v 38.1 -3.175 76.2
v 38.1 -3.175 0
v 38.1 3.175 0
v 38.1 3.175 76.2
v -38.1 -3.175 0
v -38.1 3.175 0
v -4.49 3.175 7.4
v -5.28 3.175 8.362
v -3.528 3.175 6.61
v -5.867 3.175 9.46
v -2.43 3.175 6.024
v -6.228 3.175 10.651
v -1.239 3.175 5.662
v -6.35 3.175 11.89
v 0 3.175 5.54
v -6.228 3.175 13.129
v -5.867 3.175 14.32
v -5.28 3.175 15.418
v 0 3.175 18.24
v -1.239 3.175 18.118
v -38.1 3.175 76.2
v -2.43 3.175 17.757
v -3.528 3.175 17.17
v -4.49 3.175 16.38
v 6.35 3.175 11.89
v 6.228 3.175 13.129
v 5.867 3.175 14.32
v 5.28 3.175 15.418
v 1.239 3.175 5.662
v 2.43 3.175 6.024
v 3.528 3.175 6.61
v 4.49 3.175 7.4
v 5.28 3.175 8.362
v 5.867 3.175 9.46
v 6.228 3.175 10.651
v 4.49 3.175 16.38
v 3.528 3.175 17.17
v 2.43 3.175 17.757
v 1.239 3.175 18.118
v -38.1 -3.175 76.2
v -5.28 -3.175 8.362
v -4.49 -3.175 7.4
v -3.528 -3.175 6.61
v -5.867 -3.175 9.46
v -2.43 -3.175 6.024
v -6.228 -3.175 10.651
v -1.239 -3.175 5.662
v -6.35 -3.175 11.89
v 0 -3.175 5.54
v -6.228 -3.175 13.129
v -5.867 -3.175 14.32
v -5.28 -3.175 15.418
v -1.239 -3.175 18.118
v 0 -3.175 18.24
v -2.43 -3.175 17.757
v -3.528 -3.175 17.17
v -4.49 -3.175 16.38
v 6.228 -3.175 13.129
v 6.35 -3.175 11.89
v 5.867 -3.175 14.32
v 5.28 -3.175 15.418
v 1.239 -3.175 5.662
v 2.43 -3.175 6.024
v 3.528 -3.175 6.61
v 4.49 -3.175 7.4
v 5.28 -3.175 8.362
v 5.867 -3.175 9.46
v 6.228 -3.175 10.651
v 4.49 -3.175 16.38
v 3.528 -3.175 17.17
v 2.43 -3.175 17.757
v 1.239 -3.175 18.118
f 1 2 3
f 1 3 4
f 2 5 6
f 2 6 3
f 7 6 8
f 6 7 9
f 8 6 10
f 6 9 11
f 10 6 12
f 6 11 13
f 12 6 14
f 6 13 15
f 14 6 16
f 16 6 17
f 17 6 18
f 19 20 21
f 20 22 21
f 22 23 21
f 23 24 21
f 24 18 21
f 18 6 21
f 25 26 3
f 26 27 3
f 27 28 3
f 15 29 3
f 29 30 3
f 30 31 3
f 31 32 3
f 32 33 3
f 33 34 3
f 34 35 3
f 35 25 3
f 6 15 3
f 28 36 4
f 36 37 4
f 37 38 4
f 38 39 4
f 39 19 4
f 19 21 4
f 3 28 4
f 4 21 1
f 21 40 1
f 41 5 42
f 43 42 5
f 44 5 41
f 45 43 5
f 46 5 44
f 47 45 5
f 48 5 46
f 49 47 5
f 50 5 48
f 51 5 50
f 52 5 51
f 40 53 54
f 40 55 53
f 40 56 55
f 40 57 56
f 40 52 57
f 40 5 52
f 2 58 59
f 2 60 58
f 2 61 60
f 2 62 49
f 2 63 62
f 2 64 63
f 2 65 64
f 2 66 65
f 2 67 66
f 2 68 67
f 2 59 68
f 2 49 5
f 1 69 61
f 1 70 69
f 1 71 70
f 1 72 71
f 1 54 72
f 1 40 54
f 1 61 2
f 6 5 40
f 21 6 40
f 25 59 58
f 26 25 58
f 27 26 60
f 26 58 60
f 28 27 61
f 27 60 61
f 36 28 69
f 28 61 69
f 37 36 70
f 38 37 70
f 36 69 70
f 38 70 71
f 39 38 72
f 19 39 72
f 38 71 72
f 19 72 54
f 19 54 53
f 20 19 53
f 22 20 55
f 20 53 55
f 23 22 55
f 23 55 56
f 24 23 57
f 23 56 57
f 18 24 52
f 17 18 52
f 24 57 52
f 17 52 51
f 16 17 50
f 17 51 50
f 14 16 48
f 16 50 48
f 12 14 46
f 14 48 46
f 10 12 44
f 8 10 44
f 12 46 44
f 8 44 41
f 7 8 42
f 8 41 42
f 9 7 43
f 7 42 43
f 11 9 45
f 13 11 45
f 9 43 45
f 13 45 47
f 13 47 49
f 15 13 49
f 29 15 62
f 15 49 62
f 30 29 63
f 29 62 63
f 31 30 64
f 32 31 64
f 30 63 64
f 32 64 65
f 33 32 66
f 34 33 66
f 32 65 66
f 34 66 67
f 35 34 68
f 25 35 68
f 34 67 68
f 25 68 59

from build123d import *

# Parameters (mm, degrees)
F0_W     = 76.2
F0_H     = 76.2
F1_DEPTH = 3.175
F2_R     = 6.35
F3_DEPTH = 6.35


with BuildPart() as f1:
    # F0 (on Front) → F1 (new body, symmetric)
    with BuildSketch(Plane.XZ):
        with Locations((0, 38.1)):
            Rectangle(F0_W, F0_H)
    extrude(amount=F1_DEPTH, both=True)

    # F2 (on face) → F3 (cut)
    with BuildSketch(Plane.XZ.offset(3.175)):
        with Locations((0, 11.8903209027)):
            Circle(F2_R)
    extrude(amount=-F3_DEPTH, mode=Mode.SUBTRACT)


solid = f1.part
